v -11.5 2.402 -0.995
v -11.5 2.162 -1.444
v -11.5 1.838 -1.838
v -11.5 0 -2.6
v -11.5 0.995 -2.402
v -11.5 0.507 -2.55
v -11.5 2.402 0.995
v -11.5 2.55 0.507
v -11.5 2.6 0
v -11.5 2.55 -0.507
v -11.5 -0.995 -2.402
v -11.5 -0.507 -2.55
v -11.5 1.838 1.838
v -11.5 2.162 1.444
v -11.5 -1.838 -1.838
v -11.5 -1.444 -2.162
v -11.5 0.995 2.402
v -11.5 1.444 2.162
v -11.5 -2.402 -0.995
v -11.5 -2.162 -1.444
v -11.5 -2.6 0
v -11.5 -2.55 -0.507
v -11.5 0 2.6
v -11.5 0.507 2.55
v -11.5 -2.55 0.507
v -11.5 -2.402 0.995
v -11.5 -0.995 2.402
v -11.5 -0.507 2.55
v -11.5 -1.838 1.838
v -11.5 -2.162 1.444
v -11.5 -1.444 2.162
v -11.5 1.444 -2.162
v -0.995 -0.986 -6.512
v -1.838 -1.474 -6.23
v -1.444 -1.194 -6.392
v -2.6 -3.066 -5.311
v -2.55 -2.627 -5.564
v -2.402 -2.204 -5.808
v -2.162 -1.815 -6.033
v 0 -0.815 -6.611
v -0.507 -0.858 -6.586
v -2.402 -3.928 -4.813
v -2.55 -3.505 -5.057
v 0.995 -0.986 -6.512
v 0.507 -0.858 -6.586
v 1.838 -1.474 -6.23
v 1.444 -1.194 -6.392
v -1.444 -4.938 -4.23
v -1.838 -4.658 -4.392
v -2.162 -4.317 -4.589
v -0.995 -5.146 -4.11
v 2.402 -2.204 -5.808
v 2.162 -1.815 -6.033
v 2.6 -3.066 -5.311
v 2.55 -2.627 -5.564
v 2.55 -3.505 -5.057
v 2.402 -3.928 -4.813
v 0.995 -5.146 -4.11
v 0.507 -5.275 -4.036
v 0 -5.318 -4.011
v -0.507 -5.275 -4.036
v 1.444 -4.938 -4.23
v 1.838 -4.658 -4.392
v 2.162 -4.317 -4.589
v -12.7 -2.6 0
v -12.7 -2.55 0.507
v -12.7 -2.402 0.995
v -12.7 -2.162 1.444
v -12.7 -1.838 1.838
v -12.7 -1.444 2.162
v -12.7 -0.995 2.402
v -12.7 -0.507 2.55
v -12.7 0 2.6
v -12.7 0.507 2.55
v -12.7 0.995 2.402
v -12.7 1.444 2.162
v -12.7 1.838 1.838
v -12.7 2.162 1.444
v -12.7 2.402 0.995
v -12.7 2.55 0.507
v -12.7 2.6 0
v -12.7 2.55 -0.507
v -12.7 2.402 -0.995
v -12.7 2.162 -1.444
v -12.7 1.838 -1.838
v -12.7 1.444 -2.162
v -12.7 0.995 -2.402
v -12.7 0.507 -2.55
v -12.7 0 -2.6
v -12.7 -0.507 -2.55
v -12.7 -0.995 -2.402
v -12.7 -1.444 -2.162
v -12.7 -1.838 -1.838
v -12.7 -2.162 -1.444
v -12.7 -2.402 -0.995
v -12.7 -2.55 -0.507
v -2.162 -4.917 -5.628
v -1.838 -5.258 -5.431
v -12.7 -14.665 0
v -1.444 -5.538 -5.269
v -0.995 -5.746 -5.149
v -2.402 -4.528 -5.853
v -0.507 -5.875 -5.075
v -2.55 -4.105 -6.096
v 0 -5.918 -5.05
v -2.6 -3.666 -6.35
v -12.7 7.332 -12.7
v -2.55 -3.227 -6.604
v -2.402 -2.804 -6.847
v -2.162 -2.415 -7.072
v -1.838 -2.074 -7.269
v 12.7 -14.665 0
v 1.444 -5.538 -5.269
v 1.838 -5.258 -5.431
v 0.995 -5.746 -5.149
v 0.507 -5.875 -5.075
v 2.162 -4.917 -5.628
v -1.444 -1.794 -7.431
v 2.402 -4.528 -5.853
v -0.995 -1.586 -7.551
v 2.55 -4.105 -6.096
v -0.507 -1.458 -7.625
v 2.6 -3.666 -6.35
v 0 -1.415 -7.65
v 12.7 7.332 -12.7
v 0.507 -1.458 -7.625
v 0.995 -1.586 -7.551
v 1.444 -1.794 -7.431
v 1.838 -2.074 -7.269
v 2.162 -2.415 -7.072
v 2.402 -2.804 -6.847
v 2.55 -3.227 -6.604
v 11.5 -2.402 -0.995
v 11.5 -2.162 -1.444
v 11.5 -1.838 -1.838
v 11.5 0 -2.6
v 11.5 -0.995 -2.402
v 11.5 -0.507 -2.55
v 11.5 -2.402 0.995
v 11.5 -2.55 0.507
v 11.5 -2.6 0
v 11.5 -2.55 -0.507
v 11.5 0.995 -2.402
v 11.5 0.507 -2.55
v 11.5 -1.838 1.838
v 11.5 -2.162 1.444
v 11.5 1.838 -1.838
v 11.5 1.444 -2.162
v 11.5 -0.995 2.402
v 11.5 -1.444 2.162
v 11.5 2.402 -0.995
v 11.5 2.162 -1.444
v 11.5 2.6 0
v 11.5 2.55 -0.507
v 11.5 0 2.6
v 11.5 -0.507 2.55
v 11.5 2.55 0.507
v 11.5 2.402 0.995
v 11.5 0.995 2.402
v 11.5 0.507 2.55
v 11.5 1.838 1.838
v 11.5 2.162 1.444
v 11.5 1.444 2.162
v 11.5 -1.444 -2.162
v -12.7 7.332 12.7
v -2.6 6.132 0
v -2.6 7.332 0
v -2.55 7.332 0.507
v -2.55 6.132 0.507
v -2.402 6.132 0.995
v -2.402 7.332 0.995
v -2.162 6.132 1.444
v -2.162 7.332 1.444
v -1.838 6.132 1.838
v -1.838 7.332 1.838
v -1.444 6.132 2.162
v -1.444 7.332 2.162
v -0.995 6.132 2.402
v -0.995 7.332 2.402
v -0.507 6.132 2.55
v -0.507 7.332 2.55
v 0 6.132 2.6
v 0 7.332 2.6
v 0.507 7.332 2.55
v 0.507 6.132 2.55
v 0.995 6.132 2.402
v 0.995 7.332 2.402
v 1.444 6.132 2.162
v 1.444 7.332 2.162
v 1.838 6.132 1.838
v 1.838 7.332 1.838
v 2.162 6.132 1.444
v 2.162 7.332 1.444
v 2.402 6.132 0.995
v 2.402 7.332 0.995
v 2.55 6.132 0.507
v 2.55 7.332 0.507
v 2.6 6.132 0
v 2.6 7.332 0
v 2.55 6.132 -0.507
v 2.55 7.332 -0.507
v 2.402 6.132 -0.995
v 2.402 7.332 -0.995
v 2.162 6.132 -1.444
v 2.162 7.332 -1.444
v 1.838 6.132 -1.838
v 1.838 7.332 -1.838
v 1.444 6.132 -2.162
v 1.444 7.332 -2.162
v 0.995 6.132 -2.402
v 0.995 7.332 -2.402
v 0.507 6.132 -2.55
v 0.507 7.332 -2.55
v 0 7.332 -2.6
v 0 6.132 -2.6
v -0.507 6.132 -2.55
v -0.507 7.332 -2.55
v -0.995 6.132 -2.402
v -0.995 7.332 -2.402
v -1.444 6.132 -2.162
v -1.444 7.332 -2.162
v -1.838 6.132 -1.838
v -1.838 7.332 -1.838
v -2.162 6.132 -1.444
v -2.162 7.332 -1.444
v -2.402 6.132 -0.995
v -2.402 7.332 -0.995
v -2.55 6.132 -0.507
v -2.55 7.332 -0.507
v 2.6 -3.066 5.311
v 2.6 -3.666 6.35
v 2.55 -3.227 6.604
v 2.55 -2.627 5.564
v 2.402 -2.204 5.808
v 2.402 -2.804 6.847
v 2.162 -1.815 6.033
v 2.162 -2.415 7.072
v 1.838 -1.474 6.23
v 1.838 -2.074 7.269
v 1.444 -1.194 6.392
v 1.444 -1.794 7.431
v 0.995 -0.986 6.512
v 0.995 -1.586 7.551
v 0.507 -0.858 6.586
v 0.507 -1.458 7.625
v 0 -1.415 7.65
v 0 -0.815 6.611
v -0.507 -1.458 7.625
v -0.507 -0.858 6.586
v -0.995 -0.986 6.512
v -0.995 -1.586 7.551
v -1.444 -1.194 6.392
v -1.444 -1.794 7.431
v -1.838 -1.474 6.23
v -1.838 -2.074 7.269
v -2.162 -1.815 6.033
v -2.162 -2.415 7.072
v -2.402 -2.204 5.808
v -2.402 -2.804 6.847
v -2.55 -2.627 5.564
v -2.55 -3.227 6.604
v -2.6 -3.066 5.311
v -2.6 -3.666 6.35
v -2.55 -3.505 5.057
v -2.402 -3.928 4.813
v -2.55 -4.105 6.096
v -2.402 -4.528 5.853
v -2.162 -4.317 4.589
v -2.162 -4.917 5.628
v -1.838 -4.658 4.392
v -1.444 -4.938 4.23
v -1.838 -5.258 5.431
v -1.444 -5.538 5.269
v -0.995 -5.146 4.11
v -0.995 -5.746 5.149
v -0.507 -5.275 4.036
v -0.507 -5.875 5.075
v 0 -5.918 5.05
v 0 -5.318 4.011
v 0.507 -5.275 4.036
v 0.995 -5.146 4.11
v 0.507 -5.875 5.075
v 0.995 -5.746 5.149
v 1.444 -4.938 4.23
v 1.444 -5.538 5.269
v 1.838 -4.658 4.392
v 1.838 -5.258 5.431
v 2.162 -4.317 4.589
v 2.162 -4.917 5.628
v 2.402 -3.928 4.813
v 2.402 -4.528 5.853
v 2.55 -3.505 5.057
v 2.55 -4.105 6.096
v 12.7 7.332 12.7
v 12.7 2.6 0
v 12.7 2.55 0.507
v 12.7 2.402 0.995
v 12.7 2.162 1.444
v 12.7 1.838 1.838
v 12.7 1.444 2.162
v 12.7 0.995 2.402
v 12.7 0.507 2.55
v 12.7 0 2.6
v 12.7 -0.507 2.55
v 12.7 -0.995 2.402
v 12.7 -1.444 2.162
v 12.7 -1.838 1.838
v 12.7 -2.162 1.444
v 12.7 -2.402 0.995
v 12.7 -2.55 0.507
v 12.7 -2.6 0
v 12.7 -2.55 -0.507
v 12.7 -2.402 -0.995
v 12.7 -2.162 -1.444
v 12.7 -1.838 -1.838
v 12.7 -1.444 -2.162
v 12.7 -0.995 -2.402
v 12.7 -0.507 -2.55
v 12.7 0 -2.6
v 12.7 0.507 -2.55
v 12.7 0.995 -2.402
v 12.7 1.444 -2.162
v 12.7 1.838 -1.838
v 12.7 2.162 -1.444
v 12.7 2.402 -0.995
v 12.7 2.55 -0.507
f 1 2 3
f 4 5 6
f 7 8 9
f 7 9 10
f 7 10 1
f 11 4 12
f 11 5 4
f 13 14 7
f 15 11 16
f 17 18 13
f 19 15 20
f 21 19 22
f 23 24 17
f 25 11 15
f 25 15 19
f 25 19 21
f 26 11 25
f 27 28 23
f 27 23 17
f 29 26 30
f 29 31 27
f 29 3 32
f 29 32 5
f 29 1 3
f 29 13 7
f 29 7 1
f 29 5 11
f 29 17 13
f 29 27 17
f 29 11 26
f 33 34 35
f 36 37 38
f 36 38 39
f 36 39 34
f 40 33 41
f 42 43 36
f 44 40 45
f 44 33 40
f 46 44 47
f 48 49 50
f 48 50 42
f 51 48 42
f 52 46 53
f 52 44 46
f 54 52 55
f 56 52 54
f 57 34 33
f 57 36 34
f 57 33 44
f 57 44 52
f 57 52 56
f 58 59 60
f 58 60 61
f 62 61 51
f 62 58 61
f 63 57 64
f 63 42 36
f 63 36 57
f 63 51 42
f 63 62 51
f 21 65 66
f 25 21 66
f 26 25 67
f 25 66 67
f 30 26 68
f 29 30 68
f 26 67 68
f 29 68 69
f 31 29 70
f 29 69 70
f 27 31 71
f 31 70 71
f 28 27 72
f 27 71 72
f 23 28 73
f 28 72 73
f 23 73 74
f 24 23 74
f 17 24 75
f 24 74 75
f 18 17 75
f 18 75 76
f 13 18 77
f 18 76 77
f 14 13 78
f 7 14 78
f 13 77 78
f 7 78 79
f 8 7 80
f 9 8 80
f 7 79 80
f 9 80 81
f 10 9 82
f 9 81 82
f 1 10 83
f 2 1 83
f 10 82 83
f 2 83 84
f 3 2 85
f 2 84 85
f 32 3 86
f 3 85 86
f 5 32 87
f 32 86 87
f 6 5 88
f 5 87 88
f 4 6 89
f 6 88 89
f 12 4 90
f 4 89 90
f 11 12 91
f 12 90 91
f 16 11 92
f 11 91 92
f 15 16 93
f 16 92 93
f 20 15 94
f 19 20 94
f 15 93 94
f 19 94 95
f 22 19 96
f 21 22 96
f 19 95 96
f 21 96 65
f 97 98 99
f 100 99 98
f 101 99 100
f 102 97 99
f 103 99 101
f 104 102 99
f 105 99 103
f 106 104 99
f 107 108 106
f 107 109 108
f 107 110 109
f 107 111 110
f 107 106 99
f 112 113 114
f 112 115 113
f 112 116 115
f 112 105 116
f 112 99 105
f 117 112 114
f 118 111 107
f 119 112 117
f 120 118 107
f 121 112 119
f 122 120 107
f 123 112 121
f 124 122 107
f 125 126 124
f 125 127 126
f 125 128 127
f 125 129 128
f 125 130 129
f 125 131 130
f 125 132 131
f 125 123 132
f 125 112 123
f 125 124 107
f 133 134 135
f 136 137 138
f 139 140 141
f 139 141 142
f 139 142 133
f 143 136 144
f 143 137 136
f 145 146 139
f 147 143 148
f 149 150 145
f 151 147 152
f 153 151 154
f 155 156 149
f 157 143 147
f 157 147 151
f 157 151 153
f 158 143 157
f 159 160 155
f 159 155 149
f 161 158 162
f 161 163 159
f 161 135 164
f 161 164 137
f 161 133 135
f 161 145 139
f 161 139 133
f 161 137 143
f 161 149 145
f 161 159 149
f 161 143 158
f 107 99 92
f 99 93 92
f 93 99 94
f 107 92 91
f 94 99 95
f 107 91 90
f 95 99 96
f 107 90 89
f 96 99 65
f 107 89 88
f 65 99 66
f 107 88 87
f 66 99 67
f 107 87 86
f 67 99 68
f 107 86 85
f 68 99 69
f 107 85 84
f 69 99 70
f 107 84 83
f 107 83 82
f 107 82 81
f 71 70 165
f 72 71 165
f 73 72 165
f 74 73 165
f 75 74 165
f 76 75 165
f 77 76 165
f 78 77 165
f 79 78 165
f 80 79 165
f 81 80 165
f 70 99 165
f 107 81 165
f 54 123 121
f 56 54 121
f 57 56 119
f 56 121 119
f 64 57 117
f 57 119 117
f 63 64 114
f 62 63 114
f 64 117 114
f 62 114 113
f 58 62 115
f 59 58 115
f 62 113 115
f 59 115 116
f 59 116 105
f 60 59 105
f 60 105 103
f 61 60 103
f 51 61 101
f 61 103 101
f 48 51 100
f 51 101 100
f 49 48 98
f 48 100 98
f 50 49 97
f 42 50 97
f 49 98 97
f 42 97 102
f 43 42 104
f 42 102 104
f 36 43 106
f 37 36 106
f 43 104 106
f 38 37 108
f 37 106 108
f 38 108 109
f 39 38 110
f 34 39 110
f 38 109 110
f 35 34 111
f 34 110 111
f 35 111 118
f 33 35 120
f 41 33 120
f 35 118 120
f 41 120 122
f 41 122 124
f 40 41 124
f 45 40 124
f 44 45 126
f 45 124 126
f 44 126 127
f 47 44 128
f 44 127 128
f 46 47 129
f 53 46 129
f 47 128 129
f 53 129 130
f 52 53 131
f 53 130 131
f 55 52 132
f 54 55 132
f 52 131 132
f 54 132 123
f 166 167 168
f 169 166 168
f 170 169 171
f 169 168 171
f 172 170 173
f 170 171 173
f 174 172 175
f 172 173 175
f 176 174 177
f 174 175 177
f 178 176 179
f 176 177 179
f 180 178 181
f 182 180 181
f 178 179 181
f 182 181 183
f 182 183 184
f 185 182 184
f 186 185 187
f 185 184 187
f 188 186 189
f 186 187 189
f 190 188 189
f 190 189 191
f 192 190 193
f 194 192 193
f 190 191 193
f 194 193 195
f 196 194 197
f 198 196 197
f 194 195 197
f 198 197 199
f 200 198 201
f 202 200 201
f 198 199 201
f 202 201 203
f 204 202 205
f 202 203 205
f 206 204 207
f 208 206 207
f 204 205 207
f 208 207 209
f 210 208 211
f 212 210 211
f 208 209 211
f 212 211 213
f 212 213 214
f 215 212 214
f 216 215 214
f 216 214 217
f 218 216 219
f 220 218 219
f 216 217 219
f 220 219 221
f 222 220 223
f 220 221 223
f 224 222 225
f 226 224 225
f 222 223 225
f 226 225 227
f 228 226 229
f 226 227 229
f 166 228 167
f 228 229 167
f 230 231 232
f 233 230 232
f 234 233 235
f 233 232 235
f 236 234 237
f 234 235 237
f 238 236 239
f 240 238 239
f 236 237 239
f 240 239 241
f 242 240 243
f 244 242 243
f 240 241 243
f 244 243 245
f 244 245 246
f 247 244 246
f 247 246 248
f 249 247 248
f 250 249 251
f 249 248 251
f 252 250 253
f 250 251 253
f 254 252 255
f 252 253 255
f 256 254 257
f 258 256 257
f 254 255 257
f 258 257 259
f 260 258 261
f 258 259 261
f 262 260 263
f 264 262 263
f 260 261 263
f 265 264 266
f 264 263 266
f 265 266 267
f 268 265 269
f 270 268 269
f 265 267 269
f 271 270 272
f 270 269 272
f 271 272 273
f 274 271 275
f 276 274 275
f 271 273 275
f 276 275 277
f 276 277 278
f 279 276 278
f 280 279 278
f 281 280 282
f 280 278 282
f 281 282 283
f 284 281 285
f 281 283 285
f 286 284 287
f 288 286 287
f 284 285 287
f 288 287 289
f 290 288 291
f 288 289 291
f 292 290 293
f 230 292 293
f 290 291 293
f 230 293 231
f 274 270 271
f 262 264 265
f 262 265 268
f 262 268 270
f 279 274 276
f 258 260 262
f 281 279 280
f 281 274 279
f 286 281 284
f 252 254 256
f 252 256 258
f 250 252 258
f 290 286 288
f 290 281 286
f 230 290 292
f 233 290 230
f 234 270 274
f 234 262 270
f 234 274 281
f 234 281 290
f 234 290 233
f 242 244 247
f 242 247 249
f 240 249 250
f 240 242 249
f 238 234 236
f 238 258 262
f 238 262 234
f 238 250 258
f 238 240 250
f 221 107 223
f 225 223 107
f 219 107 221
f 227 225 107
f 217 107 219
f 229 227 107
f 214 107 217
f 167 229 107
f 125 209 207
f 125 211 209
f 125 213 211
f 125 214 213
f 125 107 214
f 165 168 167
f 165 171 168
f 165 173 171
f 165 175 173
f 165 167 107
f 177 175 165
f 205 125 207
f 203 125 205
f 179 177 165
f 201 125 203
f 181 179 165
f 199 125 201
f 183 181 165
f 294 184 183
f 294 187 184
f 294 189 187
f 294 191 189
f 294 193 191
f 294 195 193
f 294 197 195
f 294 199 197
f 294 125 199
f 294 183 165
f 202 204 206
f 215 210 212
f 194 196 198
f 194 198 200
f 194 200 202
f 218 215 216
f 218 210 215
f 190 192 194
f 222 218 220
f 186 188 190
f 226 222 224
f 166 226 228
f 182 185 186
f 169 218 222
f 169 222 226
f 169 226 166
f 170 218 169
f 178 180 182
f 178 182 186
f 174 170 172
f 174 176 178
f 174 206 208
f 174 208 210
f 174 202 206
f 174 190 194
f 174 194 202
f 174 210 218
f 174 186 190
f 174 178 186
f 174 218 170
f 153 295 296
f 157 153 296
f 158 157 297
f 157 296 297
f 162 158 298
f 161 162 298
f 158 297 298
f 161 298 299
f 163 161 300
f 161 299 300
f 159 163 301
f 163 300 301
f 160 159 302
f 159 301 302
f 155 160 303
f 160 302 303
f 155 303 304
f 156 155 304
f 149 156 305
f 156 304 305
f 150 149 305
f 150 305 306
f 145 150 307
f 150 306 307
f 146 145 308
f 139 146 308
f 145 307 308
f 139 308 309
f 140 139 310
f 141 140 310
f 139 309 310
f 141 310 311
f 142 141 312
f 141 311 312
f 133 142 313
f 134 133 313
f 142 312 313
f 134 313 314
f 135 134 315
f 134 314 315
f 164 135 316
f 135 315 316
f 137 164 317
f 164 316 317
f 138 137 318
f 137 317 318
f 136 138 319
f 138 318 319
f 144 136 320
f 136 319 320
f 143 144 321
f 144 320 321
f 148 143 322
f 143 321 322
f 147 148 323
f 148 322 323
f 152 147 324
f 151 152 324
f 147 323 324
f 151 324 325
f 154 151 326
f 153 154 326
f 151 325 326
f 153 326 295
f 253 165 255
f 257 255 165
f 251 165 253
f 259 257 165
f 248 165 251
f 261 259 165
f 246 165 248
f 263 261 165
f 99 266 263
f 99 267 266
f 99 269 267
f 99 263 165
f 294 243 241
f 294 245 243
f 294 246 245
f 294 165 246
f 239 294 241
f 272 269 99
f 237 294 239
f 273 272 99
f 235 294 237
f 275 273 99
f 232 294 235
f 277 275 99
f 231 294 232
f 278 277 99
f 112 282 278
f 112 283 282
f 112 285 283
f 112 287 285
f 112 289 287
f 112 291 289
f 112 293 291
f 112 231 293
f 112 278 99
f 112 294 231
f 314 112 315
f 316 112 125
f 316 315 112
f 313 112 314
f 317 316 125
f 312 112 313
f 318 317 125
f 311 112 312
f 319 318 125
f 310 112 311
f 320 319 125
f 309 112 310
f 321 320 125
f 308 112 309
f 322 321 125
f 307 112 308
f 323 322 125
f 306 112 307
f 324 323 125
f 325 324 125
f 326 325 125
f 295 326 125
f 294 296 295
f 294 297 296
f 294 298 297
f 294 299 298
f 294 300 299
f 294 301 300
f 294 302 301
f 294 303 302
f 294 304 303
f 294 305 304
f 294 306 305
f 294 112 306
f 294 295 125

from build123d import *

# Parameters (mm, degrees)
F1_DEPTH  = 12.7
F6_R      = 2.6
F7_DEPTH  = 1.2
F4_R      = 2.6
F8_DEPTH  = 1.2
F5_R      = 2.6
F9_DEPTH  = 1.2
F3_R      = 2.6
F10_DEPTH = 1.2
F2_R      = 2.6
F11_DEPTH = 1.2


with BuildPart() as f1:
    # F0 (on Right) → F1 (new body, symmetric)
    with BuildSketch(Plane.YZ):
        Polygon((7.3323484187, -12.7), (7.3323484187, 12.7), (-14.6646968374, 0), align=None)
    extrude(amount=F1_DEPTH, both=True)

    # F6 (on face) → F7 (cut)
    with BuildSketch(Plane.YZ.offset(12.7)):
        Circle(F6_R)
    extrude(amount=-F7_DEPTH, mode=Mode.SUBTRACT)

    # F4 (on face) → F8 (cut)
    with BuildSketch(Plane(origin=(0, -3.6661742094, -6.35), x_dir=(1, 0, 0), z_dir=(0, -0.5, -0.8660254038))):
        Circle(F4_R)
    extrude(amount=-F8_DEPTH, mode=Mode.SUBTRACT)

    # F5 (on face) → F9 (cut)
    with BuildSketch(Plane(origin=(-12.7, 0, 0), x_dir=(0, -1, 0), z_dir=(-1, 0, 0))):
        Circle(F5_R)
    extrude(amount=-F9_DEPTH, mode=Mode.SUBTRACT)

    # F3 (on face) → F10 (cut)
    with BuildSketch(Plane(origin=(0, 7.3323484187, 0), x_dir=(-1, 0, 0), z_dir=(0, 1, 0))):
        Circle(F3_R)
    extrude(amount=-F10_DEPTH, mode=Mode.SUBTRACT)

    # F2 (on face) → F11 (cut)
    with BuildSketch(Plane(origin=(0, -3.6661742094, 6.35), x_dir=(1, 0, 0), z_dir=(0, -0.5, 0.8660254038))):
        Circle(F2_R)
    extrude(amount=-F11_DEPTH, mode=Mode.SUBTRACT)


solid = f1.part
